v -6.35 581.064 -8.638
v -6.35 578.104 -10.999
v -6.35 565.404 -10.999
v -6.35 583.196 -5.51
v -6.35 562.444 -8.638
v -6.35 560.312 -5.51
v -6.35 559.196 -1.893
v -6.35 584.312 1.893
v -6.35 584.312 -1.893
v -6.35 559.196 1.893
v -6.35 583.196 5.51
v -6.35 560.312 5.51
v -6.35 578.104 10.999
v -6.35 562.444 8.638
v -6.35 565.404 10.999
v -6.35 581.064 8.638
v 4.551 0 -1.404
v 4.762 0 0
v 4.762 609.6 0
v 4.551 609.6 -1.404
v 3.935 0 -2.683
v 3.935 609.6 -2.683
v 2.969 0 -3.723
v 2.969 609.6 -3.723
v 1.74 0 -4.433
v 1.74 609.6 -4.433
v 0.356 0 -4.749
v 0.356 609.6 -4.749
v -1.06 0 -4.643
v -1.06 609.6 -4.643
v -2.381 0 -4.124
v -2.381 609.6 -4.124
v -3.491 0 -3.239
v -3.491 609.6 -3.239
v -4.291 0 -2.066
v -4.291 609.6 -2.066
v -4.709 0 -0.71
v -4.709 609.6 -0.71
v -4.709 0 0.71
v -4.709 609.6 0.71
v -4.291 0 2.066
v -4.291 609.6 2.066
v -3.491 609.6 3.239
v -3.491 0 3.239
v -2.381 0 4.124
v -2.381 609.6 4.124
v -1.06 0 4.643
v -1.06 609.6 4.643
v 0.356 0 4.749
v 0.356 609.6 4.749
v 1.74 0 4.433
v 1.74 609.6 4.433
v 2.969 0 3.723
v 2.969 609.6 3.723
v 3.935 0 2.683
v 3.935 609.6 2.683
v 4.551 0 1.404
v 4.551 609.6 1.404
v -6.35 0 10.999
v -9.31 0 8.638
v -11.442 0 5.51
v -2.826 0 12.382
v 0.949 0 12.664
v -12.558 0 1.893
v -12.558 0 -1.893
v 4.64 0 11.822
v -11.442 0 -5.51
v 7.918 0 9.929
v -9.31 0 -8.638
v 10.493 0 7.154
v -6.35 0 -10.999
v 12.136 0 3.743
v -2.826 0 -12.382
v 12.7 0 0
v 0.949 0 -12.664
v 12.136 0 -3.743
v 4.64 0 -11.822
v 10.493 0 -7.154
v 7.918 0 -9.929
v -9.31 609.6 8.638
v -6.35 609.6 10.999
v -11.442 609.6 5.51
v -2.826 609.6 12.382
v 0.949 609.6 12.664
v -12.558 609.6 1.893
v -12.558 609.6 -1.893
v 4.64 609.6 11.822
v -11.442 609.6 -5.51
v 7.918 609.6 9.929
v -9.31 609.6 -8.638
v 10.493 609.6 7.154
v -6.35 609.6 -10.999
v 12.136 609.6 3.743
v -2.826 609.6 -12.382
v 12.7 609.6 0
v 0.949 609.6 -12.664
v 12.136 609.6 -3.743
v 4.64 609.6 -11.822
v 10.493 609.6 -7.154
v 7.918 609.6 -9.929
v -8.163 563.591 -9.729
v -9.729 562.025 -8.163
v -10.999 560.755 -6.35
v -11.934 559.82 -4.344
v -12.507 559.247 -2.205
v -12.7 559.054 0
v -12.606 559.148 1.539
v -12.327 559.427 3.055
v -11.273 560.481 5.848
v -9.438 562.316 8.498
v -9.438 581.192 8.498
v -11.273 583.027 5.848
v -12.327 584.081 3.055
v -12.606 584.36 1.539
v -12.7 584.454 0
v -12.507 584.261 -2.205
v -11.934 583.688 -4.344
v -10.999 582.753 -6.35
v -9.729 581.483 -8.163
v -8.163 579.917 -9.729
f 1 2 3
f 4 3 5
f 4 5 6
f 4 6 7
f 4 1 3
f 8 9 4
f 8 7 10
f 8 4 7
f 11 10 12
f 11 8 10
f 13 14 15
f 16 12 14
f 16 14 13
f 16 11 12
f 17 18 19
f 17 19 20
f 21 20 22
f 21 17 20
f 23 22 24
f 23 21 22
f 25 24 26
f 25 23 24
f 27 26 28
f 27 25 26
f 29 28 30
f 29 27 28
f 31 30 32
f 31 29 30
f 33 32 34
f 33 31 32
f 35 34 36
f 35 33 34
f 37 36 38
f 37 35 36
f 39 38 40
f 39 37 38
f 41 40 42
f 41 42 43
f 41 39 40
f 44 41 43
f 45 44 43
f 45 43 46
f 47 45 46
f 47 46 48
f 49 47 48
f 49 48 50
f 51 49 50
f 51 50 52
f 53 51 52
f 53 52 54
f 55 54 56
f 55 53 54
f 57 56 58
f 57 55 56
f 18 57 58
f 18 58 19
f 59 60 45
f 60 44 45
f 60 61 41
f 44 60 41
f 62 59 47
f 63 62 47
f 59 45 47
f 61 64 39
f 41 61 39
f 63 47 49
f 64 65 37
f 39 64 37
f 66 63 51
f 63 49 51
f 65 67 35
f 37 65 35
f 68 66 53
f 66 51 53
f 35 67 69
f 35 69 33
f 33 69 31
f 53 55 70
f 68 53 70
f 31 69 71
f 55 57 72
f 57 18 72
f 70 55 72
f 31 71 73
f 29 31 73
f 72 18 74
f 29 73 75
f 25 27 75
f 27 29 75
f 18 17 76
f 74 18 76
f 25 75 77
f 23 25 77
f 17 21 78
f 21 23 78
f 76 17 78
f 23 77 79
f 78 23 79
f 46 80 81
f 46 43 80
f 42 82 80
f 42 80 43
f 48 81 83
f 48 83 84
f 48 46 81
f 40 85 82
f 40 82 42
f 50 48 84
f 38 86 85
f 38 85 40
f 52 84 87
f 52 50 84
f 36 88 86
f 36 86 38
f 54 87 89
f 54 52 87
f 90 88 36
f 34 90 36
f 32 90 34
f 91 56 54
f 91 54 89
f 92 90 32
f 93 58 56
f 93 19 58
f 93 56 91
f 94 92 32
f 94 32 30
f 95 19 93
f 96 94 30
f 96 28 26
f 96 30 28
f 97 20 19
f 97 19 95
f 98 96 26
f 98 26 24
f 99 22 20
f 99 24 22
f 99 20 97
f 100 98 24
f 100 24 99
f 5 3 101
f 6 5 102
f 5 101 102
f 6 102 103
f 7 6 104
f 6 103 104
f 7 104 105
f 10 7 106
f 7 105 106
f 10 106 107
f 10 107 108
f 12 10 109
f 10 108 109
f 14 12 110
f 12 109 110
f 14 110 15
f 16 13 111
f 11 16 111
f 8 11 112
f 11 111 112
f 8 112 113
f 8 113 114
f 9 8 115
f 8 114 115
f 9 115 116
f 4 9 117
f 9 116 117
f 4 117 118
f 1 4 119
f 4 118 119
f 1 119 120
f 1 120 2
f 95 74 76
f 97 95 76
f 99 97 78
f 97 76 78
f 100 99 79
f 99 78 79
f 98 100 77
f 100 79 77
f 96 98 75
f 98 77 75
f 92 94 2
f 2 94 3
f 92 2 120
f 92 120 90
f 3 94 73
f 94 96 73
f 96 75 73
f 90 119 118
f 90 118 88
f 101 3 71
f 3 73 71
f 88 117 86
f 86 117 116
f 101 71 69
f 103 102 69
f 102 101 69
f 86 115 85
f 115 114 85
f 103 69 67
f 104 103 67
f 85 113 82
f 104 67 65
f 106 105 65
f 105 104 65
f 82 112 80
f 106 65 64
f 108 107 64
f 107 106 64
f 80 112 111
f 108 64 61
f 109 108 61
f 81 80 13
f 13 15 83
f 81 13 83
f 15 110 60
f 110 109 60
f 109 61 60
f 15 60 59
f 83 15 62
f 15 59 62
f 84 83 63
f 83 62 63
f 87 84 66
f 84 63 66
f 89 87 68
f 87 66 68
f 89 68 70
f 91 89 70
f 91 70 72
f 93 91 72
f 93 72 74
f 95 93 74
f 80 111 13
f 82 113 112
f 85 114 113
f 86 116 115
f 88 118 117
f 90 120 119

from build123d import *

# Parameters (mm, degrees)
SKETCH1_R           = 12.7
SKETCH1_R_2         = 4.7625
BOSS_EXTRUDE1_DEPTH = 609.6
SKETCH3_R           = 12.7
CUT_EXTRUDE1_DEPTH  = 6.35


with BuildPart() as part:
    # Sketch1 → Boss-Extrude1 (new body)
    with BuildSketch(Plane(origin=(0, 0, 0), x_dir=(1, 0, 0), z_dir=(0, 1, 0))):
        Circle(SKETCH1_R)
        Circle(SKETCH1_R_2, mode=Mode.SUBTRACT)
    extrude(amount=BOSS_EXTRUDE1_DEPTH)

    # Sketch3 → Cut-Extrude1 (cut)
    with BuildSketch(Plane.ZY.offset(12.7)):
        with Locations((0, 571.754)):
            Circle(SKETCH3_R)
    extrude(amount=-CUT_EXTRUDE1_DEPTH, mode=Mode.SUBTRACT)


solid = part.part
